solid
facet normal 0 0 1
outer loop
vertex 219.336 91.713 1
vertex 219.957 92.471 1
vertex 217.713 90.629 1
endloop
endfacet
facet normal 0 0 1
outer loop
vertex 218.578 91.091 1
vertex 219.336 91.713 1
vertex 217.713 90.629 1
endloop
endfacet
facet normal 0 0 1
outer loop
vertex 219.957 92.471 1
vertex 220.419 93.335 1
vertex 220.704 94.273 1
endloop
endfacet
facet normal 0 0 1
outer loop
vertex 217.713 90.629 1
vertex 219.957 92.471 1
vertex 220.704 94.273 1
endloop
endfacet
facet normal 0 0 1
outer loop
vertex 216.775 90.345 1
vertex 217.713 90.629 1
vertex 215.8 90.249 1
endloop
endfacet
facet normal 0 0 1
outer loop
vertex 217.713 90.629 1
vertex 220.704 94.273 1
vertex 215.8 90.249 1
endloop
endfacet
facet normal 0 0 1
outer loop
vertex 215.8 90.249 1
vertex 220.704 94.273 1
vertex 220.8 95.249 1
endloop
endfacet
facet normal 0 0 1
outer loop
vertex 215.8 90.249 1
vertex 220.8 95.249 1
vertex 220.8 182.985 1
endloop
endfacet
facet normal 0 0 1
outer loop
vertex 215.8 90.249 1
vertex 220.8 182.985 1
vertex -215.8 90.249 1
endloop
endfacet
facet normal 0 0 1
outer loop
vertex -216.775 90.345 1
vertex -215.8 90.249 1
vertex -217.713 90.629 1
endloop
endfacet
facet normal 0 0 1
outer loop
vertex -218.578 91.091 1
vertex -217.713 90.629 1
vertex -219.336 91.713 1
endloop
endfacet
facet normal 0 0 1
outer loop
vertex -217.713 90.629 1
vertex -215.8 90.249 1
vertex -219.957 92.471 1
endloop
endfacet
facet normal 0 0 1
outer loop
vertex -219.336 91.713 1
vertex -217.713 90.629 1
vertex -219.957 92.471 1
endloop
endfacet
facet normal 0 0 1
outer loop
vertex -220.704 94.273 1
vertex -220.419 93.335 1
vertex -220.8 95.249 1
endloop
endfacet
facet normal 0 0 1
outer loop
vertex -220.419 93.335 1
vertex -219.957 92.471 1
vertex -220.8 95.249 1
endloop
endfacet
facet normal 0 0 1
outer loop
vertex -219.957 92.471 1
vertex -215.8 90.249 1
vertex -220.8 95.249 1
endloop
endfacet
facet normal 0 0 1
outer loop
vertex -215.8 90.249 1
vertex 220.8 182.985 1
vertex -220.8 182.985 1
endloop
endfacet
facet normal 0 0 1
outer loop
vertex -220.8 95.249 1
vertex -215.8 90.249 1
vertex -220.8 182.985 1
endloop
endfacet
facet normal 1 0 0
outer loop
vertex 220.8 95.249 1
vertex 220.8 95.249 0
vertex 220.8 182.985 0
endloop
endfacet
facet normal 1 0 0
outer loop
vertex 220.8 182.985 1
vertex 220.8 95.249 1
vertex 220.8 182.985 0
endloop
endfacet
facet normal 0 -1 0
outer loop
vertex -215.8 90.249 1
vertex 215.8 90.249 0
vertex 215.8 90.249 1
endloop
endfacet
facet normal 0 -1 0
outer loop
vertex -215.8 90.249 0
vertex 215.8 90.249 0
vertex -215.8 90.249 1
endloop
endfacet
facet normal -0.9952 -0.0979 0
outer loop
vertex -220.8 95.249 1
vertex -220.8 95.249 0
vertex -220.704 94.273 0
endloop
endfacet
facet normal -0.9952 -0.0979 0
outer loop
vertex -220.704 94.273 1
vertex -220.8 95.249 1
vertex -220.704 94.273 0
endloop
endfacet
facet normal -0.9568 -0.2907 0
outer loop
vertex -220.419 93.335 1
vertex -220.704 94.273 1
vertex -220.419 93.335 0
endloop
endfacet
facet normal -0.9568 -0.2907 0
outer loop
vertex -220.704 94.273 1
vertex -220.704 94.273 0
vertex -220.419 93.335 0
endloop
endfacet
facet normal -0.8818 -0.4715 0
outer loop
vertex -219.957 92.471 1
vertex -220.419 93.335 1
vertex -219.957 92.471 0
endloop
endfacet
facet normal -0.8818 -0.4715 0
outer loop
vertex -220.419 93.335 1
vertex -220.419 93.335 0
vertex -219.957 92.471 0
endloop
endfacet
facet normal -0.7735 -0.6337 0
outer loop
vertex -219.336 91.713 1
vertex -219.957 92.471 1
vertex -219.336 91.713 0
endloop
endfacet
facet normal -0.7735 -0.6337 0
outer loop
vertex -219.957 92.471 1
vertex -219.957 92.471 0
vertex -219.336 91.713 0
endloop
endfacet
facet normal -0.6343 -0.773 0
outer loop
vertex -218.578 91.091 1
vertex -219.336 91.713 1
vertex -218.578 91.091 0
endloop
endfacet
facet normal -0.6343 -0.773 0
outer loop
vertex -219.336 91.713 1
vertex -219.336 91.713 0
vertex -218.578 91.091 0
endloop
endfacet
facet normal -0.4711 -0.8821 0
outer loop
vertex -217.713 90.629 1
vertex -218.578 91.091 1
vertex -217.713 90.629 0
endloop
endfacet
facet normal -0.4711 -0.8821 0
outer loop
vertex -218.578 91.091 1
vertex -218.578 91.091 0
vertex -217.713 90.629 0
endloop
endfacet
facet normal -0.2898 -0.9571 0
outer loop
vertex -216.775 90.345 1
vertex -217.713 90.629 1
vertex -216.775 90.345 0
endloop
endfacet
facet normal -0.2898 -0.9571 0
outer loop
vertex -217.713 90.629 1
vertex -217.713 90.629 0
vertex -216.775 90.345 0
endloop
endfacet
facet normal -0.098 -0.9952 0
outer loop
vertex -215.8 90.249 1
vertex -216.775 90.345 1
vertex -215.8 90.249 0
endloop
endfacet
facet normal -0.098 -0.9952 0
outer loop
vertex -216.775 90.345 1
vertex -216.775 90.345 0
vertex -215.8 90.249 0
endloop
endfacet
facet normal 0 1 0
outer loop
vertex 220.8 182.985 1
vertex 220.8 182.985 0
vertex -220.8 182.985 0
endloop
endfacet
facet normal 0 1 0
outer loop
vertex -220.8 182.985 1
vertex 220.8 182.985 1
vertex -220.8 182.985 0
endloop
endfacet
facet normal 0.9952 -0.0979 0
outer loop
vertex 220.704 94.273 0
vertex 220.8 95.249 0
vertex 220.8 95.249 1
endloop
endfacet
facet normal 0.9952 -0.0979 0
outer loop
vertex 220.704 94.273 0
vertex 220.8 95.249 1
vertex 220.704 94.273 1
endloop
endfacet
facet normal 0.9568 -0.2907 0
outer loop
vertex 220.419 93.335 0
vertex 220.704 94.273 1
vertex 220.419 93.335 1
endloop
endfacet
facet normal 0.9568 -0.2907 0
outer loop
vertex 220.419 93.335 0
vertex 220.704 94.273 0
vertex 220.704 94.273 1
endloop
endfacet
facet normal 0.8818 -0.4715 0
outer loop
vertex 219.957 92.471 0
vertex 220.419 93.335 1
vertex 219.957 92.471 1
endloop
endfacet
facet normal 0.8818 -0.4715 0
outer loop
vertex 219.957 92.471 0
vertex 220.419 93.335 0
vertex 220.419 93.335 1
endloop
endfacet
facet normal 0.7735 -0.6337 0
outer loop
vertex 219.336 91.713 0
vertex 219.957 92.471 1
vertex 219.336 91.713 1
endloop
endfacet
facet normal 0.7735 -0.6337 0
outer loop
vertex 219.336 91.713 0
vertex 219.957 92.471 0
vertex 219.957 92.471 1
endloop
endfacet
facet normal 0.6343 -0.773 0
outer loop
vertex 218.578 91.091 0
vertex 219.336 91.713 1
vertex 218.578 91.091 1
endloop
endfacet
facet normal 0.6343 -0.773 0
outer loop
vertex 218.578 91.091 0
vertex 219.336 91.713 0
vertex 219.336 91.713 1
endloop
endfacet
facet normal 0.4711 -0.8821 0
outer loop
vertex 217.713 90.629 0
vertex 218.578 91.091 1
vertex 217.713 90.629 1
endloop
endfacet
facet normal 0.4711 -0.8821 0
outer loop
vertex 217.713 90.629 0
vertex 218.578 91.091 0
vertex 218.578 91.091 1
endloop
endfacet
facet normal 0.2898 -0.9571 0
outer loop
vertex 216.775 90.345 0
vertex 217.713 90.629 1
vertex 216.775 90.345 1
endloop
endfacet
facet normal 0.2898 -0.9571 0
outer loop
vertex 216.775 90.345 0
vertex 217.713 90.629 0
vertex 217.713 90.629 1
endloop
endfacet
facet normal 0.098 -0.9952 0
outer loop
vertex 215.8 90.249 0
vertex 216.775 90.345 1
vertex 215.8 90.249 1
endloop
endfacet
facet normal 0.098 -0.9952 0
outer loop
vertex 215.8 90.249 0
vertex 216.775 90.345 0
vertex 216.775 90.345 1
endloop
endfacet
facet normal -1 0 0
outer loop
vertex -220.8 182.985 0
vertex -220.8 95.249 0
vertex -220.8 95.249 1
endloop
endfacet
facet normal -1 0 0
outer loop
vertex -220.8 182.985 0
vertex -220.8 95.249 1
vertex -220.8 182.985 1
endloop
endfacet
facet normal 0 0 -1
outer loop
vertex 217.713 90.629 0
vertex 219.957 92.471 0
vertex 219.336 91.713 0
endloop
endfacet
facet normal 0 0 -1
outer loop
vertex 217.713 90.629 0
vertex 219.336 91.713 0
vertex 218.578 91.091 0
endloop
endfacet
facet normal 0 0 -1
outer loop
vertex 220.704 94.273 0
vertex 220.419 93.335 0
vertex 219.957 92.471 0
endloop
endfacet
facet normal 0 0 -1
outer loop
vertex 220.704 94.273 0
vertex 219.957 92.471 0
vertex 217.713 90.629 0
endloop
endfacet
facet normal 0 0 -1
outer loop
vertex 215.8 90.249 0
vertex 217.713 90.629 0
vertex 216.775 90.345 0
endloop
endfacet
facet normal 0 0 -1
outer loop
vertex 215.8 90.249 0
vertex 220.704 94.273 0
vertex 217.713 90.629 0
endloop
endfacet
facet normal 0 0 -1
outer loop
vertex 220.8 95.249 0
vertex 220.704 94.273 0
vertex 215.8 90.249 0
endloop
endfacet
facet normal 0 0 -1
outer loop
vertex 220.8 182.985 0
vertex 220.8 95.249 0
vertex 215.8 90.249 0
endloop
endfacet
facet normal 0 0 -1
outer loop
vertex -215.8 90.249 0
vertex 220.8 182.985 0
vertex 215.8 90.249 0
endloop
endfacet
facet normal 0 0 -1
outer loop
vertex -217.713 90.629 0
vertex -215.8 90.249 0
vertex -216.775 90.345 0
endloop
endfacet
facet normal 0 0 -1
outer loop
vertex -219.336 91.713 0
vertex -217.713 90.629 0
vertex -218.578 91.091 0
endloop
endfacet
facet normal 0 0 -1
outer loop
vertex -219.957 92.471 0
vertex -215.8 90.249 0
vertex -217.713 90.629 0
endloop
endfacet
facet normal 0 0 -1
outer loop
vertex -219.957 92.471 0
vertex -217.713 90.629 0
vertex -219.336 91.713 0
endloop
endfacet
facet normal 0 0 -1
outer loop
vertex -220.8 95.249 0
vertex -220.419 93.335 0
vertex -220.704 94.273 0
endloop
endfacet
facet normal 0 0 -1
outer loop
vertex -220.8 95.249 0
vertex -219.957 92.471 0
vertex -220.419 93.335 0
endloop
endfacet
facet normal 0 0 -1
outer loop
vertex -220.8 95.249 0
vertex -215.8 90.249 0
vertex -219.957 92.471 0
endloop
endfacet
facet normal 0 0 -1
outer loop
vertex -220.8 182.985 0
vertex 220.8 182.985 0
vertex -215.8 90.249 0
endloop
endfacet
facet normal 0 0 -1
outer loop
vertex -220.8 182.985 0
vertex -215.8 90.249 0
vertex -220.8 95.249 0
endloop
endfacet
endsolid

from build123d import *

# Parameters (mm, degrees)
SKETCH1_W          = 220.8
SKETCH1_H          = 92.7366
BASE_FLANGE_DEPTH  = 1
BREAK_CORNER_DEPTH = 1


# Read off the part's stored shape, not the designer's step: Break-Corner
# Sheet-metal steps are written as plain solids
with BuildPart() as part:
    # Sketch1 → Base-Flange (new body)
    with BuildSketch(Plane.XY):
        with Locations((110.4, 136.6169868)):
            Rectangle(SKETCH1_W, SKETCH1_H)
    extrude(amount=BASE_FLANGE_DEPTH)

    # Break-Corner outline → Break-Corner (cut)
    with BuildSketch(Plane.XY):
        with BuildLine():
            Line((220.8, 90.2486868), (220.8, 95.2486868))
            ThreePointArc((220.8, 95.2486868), (219.335533906, 91.713152894), (215.8, 90.2486868))
            Line((215.8, 90.2486868), (220.8, 90.2486868))
        make_face()
    extrude(amount=BREAK_CORNER_DEPTH, mode=Mode.SUBTRACT)

    # Mirror-Vertical: part across plane


with BuildPart() as part_1:
    add(part.part)
    add(part.part.mirror(Plane(origin=(0, 182.9852868, 1), x_dir=(0, 0, 1), z_dir=(1, 0, 0))))


solid = part_1.part
